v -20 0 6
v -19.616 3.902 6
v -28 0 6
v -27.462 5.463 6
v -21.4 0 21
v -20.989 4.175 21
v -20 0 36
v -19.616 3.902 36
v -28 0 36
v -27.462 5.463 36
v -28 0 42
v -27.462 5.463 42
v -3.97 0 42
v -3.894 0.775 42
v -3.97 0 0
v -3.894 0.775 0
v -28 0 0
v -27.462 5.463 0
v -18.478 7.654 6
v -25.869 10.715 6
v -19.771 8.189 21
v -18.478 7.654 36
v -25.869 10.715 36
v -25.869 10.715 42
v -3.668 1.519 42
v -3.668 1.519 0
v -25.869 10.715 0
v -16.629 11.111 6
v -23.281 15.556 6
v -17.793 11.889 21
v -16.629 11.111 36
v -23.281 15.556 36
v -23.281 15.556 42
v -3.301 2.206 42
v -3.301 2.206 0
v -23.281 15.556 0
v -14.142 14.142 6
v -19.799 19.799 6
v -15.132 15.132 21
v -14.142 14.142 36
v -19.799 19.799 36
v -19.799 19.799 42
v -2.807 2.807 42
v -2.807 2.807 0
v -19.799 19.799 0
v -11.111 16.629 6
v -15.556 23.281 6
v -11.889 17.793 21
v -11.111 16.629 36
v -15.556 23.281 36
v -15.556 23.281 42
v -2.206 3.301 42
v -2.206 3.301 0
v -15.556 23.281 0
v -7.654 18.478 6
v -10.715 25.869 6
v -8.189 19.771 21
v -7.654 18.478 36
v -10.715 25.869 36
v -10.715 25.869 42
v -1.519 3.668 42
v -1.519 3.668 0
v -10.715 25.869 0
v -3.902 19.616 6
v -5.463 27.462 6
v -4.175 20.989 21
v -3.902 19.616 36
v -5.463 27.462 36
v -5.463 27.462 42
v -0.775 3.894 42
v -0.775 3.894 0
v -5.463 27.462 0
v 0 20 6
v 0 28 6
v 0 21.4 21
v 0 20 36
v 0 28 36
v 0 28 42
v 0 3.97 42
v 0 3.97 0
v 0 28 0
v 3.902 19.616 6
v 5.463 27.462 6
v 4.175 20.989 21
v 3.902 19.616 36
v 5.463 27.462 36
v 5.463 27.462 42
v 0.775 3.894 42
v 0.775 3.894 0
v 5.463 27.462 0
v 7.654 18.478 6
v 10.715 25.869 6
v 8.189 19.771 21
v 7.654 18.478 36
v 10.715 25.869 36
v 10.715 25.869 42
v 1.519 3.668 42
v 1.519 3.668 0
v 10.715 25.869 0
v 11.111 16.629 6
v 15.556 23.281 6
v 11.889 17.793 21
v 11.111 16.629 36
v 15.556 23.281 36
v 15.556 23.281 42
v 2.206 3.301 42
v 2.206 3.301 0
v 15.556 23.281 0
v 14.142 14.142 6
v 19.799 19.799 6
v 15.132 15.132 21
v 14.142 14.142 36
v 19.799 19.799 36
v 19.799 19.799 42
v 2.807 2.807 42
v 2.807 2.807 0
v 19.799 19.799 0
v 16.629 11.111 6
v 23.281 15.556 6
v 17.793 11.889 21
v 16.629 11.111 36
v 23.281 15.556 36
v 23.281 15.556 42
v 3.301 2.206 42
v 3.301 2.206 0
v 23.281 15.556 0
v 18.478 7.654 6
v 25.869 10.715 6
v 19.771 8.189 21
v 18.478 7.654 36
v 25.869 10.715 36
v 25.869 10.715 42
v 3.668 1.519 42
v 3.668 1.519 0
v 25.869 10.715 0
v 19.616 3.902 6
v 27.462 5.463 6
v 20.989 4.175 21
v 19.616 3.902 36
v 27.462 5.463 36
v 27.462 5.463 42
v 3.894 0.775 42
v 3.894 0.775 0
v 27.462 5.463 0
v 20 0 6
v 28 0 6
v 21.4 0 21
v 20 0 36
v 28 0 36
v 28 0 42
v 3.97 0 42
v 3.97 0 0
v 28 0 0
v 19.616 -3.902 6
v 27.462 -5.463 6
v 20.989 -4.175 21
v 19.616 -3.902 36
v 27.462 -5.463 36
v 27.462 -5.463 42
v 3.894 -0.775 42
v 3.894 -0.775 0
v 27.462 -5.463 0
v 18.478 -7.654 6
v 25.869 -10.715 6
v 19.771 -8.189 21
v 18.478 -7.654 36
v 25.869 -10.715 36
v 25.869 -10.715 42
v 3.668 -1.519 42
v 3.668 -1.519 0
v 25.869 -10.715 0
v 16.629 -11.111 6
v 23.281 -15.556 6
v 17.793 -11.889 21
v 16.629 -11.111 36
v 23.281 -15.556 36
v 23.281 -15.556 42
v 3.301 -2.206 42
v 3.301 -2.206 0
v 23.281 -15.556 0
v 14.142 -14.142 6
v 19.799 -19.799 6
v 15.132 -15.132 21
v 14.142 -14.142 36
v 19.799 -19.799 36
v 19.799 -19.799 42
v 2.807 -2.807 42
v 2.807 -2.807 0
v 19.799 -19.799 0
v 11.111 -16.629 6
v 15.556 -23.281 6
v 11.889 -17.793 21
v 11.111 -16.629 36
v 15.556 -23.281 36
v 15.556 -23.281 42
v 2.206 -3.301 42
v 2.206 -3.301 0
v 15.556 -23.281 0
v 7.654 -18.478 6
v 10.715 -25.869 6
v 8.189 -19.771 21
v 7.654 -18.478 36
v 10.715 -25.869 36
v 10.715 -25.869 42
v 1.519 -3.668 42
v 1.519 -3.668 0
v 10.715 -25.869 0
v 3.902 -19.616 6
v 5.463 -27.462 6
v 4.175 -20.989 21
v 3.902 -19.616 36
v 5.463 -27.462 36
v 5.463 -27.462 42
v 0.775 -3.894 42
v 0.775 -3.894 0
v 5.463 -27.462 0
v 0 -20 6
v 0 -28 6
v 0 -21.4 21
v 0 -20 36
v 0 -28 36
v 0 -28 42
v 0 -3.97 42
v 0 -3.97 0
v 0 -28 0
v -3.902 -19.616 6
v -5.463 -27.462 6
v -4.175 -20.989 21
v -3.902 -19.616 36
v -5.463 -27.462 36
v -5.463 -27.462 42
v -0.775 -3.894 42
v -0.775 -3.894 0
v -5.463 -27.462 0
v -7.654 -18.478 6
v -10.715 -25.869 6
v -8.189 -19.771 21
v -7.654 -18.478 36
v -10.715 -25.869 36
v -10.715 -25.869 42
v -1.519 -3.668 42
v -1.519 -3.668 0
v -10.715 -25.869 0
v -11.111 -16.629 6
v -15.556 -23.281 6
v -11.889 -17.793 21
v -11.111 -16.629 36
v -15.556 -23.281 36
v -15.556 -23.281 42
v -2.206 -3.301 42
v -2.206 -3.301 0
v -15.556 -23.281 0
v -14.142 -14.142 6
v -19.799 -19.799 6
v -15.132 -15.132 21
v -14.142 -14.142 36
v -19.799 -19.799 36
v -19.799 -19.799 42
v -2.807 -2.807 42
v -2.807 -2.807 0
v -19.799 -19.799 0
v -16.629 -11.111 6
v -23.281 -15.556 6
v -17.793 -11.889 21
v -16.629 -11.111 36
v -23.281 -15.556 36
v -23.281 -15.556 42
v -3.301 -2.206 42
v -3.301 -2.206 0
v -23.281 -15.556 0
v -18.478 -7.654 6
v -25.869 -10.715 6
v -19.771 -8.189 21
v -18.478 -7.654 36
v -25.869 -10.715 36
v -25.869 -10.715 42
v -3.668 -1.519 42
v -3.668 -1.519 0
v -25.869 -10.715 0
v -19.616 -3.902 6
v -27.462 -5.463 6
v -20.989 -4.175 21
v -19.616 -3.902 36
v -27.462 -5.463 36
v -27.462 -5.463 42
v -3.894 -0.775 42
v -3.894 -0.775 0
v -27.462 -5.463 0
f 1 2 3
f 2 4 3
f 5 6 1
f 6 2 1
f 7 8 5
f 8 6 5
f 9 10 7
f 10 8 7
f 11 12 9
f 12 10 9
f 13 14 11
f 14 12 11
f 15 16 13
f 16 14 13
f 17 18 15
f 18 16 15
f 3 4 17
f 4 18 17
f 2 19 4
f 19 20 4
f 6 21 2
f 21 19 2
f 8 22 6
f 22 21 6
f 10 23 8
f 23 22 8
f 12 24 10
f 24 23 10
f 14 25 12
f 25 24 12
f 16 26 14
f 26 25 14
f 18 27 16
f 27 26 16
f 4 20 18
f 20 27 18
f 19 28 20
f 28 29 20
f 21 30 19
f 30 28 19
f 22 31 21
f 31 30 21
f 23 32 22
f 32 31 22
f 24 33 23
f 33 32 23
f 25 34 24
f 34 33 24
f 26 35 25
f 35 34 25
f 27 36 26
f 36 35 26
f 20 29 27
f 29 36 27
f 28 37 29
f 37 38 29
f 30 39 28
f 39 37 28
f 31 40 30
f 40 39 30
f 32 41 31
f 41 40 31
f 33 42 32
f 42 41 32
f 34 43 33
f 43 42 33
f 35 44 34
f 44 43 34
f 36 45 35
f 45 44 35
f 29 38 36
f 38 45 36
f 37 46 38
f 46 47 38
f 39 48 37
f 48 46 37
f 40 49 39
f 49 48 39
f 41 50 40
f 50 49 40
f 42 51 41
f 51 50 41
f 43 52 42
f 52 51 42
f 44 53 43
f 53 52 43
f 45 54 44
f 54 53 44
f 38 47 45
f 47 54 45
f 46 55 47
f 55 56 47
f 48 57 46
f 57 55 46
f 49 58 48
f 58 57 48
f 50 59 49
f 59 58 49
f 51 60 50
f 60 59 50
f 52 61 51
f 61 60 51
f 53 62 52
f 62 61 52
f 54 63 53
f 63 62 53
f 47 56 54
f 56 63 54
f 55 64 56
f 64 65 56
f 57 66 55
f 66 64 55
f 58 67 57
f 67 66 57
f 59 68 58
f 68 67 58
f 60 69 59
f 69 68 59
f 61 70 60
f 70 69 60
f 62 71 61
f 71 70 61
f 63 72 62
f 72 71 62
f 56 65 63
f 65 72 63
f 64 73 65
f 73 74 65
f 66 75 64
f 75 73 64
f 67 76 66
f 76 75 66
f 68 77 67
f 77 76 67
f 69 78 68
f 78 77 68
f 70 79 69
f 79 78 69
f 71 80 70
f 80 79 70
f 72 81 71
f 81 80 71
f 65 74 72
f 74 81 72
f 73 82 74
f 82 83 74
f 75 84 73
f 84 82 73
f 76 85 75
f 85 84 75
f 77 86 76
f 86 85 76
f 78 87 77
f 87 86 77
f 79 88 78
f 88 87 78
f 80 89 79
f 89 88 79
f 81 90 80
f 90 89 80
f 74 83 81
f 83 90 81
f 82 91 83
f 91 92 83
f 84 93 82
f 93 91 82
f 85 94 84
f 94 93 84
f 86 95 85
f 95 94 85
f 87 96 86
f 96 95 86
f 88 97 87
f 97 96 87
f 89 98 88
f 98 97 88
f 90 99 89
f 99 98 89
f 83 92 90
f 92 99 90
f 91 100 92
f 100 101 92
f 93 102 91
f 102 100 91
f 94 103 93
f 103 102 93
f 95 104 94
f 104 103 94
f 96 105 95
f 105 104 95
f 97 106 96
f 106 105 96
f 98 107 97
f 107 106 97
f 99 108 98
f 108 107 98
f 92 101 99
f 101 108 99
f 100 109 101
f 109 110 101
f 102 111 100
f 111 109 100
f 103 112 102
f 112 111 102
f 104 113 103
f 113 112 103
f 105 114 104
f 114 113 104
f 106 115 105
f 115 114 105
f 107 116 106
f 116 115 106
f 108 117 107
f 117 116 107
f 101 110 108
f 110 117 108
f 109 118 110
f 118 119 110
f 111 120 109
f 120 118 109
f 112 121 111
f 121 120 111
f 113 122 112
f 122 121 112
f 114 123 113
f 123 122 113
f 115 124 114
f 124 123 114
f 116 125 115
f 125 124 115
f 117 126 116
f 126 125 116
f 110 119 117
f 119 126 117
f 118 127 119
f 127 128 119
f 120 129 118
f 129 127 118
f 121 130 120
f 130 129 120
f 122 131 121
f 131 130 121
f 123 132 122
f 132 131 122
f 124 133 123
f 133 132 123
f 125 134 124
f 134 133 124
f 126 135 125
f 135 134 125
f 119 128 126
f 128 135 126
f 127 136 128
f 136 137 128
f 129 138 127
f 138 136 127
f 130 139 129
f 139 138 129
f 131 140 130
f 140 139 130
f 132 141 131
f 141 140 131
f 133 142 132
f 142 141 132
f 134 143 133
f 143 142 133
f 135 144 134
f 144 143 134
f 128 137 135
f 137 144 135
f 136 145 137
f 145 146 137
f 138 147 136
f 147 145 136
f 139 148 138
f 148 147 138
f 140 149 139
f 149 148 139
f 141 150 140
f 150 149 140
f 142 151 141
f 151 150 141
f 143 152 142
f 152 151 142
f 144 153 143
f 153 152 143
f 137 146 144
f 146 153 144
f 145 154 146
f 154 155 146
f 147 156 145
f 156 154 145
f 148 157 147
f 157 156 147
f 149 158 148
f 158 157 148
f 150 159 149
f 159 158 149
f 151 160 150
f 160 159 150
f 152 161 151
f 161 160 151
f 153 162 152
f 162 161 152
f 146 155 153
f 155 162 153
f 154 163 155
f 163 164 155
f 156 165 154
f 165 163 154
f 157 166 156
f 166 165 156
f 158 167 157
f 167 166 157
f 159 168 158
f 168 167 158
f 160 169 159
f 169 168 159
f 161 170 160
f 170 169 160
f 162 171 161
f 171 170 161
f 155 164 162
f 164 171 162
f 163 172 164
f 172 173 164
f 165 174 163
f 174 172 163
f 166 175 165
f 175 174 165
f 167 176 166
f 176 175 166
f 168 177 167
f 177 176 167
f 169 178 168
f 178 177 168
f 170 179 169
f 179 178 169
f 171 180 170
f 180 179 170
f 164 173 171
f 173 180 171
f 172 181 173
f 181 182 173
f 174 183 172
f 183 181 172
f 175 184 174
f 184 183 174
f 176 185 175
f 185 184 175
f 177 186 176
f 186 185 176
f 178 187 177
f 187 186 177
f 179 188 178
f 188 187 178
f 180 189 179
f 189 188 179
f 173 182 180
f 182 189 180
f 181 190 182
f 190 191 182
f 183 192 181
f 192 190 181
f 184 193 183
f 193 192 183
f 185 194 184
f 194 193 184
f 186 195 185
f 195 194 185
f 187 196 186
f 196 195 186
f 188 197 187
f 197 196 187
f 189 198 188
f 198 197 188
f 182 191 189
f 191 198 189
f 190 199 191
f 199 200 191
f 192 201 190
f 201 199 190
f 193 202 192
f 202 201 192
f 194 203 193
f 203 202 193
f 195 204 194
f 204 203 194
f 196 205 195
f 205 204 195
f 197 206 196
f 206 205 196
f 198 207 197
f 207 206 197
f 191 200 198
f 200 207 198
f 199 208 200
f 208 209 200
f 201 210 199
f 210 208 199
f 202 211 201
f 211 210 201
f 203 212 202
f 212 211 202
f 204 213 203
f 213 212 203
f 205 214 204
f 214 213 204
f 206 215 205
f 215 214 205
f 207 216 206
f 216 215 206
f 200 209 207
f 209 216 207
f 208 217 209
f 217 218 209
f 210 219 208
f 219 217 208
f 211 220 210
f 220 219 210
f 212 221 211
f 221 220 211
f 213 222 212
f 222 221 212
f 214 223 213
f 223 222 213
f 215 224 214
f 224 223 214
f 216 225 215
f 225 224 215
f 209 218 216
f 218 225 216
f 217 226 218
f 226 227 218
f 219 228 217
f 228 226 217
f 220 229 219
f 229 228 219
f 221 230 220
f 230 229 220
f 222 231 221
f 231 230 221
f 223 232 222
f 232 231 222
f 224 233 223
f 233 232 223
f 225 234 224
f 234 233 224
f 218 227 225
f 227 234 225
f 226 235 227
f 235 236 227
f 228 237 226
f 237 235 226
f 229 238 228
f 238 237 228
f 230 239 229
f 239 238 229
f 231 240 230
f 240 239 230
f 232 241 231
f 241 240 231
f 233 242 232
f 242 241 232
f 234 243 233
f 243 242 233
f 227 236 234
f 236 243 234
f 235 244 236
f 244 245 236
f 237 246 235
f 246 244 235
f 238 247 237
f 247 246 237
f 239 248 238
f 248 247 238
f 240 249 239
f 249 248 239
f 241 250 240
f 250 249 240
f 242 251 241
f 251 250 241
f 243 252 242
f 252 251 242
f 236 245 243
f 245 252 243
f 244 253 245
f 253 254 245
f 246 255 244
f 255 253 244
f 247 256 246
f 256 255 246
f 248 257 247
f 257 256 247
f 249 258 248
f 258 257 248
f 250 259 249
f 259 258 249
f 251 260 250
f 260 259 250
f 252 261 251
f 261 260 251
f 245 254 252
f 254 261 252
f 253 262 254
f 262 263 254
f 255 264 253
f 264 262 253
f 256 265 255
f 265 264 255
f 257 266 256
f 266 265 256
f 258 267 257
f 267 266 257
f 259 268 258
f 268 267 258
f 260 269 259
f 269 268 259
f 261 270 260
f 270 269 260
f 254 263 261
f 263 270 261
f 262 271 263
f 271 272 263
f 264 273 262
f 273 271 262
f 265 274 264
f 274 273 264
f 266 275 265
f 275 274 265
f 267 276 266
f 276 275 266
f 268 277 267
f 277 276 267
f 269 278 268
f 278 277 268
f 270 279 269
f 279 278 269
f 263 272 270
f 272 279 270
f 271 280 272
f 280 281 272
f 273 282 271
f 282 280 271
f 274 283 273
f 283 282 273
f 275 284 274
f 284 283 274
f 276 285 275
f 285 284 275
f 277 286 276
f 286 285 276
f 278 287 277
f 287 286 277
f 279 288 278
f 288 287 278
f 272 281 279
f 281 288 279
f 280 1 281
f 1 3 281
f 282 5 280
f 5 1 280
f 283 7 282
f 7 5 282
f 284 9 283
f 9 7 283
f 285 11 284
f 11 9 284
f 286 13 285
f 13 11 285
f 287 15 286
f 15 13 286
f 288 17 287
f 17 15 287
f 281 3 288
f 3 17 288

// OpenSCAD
$fn = 32;

// ----------------------------------------------------------------------
// Belt roller: 40 mm barrel, 42 mm wide, bore 7.94 mm
// ----------------------------------------------------------------------

// --- parameters (mm) ---
bore_d = 7.94;            // bore
barrel_d = 40;            // barrel diameter
roller_w = 42;            // roller width
flange_d = 56;            // flange diameter
flange_t = 6;             // flange thickness
hub_d = 23.94;            // hub diameter

roller_profile = [[3.97, 0], [28, 0], [28, 6], [20, 6], [21.4, 21], [20, 36], [28, 36], [28, 42], [3.97, 42]];

/* the profile stays clear of the axis, so the bore comes out of the revolve */
rotate_extrude() polygon(roller_profile);
